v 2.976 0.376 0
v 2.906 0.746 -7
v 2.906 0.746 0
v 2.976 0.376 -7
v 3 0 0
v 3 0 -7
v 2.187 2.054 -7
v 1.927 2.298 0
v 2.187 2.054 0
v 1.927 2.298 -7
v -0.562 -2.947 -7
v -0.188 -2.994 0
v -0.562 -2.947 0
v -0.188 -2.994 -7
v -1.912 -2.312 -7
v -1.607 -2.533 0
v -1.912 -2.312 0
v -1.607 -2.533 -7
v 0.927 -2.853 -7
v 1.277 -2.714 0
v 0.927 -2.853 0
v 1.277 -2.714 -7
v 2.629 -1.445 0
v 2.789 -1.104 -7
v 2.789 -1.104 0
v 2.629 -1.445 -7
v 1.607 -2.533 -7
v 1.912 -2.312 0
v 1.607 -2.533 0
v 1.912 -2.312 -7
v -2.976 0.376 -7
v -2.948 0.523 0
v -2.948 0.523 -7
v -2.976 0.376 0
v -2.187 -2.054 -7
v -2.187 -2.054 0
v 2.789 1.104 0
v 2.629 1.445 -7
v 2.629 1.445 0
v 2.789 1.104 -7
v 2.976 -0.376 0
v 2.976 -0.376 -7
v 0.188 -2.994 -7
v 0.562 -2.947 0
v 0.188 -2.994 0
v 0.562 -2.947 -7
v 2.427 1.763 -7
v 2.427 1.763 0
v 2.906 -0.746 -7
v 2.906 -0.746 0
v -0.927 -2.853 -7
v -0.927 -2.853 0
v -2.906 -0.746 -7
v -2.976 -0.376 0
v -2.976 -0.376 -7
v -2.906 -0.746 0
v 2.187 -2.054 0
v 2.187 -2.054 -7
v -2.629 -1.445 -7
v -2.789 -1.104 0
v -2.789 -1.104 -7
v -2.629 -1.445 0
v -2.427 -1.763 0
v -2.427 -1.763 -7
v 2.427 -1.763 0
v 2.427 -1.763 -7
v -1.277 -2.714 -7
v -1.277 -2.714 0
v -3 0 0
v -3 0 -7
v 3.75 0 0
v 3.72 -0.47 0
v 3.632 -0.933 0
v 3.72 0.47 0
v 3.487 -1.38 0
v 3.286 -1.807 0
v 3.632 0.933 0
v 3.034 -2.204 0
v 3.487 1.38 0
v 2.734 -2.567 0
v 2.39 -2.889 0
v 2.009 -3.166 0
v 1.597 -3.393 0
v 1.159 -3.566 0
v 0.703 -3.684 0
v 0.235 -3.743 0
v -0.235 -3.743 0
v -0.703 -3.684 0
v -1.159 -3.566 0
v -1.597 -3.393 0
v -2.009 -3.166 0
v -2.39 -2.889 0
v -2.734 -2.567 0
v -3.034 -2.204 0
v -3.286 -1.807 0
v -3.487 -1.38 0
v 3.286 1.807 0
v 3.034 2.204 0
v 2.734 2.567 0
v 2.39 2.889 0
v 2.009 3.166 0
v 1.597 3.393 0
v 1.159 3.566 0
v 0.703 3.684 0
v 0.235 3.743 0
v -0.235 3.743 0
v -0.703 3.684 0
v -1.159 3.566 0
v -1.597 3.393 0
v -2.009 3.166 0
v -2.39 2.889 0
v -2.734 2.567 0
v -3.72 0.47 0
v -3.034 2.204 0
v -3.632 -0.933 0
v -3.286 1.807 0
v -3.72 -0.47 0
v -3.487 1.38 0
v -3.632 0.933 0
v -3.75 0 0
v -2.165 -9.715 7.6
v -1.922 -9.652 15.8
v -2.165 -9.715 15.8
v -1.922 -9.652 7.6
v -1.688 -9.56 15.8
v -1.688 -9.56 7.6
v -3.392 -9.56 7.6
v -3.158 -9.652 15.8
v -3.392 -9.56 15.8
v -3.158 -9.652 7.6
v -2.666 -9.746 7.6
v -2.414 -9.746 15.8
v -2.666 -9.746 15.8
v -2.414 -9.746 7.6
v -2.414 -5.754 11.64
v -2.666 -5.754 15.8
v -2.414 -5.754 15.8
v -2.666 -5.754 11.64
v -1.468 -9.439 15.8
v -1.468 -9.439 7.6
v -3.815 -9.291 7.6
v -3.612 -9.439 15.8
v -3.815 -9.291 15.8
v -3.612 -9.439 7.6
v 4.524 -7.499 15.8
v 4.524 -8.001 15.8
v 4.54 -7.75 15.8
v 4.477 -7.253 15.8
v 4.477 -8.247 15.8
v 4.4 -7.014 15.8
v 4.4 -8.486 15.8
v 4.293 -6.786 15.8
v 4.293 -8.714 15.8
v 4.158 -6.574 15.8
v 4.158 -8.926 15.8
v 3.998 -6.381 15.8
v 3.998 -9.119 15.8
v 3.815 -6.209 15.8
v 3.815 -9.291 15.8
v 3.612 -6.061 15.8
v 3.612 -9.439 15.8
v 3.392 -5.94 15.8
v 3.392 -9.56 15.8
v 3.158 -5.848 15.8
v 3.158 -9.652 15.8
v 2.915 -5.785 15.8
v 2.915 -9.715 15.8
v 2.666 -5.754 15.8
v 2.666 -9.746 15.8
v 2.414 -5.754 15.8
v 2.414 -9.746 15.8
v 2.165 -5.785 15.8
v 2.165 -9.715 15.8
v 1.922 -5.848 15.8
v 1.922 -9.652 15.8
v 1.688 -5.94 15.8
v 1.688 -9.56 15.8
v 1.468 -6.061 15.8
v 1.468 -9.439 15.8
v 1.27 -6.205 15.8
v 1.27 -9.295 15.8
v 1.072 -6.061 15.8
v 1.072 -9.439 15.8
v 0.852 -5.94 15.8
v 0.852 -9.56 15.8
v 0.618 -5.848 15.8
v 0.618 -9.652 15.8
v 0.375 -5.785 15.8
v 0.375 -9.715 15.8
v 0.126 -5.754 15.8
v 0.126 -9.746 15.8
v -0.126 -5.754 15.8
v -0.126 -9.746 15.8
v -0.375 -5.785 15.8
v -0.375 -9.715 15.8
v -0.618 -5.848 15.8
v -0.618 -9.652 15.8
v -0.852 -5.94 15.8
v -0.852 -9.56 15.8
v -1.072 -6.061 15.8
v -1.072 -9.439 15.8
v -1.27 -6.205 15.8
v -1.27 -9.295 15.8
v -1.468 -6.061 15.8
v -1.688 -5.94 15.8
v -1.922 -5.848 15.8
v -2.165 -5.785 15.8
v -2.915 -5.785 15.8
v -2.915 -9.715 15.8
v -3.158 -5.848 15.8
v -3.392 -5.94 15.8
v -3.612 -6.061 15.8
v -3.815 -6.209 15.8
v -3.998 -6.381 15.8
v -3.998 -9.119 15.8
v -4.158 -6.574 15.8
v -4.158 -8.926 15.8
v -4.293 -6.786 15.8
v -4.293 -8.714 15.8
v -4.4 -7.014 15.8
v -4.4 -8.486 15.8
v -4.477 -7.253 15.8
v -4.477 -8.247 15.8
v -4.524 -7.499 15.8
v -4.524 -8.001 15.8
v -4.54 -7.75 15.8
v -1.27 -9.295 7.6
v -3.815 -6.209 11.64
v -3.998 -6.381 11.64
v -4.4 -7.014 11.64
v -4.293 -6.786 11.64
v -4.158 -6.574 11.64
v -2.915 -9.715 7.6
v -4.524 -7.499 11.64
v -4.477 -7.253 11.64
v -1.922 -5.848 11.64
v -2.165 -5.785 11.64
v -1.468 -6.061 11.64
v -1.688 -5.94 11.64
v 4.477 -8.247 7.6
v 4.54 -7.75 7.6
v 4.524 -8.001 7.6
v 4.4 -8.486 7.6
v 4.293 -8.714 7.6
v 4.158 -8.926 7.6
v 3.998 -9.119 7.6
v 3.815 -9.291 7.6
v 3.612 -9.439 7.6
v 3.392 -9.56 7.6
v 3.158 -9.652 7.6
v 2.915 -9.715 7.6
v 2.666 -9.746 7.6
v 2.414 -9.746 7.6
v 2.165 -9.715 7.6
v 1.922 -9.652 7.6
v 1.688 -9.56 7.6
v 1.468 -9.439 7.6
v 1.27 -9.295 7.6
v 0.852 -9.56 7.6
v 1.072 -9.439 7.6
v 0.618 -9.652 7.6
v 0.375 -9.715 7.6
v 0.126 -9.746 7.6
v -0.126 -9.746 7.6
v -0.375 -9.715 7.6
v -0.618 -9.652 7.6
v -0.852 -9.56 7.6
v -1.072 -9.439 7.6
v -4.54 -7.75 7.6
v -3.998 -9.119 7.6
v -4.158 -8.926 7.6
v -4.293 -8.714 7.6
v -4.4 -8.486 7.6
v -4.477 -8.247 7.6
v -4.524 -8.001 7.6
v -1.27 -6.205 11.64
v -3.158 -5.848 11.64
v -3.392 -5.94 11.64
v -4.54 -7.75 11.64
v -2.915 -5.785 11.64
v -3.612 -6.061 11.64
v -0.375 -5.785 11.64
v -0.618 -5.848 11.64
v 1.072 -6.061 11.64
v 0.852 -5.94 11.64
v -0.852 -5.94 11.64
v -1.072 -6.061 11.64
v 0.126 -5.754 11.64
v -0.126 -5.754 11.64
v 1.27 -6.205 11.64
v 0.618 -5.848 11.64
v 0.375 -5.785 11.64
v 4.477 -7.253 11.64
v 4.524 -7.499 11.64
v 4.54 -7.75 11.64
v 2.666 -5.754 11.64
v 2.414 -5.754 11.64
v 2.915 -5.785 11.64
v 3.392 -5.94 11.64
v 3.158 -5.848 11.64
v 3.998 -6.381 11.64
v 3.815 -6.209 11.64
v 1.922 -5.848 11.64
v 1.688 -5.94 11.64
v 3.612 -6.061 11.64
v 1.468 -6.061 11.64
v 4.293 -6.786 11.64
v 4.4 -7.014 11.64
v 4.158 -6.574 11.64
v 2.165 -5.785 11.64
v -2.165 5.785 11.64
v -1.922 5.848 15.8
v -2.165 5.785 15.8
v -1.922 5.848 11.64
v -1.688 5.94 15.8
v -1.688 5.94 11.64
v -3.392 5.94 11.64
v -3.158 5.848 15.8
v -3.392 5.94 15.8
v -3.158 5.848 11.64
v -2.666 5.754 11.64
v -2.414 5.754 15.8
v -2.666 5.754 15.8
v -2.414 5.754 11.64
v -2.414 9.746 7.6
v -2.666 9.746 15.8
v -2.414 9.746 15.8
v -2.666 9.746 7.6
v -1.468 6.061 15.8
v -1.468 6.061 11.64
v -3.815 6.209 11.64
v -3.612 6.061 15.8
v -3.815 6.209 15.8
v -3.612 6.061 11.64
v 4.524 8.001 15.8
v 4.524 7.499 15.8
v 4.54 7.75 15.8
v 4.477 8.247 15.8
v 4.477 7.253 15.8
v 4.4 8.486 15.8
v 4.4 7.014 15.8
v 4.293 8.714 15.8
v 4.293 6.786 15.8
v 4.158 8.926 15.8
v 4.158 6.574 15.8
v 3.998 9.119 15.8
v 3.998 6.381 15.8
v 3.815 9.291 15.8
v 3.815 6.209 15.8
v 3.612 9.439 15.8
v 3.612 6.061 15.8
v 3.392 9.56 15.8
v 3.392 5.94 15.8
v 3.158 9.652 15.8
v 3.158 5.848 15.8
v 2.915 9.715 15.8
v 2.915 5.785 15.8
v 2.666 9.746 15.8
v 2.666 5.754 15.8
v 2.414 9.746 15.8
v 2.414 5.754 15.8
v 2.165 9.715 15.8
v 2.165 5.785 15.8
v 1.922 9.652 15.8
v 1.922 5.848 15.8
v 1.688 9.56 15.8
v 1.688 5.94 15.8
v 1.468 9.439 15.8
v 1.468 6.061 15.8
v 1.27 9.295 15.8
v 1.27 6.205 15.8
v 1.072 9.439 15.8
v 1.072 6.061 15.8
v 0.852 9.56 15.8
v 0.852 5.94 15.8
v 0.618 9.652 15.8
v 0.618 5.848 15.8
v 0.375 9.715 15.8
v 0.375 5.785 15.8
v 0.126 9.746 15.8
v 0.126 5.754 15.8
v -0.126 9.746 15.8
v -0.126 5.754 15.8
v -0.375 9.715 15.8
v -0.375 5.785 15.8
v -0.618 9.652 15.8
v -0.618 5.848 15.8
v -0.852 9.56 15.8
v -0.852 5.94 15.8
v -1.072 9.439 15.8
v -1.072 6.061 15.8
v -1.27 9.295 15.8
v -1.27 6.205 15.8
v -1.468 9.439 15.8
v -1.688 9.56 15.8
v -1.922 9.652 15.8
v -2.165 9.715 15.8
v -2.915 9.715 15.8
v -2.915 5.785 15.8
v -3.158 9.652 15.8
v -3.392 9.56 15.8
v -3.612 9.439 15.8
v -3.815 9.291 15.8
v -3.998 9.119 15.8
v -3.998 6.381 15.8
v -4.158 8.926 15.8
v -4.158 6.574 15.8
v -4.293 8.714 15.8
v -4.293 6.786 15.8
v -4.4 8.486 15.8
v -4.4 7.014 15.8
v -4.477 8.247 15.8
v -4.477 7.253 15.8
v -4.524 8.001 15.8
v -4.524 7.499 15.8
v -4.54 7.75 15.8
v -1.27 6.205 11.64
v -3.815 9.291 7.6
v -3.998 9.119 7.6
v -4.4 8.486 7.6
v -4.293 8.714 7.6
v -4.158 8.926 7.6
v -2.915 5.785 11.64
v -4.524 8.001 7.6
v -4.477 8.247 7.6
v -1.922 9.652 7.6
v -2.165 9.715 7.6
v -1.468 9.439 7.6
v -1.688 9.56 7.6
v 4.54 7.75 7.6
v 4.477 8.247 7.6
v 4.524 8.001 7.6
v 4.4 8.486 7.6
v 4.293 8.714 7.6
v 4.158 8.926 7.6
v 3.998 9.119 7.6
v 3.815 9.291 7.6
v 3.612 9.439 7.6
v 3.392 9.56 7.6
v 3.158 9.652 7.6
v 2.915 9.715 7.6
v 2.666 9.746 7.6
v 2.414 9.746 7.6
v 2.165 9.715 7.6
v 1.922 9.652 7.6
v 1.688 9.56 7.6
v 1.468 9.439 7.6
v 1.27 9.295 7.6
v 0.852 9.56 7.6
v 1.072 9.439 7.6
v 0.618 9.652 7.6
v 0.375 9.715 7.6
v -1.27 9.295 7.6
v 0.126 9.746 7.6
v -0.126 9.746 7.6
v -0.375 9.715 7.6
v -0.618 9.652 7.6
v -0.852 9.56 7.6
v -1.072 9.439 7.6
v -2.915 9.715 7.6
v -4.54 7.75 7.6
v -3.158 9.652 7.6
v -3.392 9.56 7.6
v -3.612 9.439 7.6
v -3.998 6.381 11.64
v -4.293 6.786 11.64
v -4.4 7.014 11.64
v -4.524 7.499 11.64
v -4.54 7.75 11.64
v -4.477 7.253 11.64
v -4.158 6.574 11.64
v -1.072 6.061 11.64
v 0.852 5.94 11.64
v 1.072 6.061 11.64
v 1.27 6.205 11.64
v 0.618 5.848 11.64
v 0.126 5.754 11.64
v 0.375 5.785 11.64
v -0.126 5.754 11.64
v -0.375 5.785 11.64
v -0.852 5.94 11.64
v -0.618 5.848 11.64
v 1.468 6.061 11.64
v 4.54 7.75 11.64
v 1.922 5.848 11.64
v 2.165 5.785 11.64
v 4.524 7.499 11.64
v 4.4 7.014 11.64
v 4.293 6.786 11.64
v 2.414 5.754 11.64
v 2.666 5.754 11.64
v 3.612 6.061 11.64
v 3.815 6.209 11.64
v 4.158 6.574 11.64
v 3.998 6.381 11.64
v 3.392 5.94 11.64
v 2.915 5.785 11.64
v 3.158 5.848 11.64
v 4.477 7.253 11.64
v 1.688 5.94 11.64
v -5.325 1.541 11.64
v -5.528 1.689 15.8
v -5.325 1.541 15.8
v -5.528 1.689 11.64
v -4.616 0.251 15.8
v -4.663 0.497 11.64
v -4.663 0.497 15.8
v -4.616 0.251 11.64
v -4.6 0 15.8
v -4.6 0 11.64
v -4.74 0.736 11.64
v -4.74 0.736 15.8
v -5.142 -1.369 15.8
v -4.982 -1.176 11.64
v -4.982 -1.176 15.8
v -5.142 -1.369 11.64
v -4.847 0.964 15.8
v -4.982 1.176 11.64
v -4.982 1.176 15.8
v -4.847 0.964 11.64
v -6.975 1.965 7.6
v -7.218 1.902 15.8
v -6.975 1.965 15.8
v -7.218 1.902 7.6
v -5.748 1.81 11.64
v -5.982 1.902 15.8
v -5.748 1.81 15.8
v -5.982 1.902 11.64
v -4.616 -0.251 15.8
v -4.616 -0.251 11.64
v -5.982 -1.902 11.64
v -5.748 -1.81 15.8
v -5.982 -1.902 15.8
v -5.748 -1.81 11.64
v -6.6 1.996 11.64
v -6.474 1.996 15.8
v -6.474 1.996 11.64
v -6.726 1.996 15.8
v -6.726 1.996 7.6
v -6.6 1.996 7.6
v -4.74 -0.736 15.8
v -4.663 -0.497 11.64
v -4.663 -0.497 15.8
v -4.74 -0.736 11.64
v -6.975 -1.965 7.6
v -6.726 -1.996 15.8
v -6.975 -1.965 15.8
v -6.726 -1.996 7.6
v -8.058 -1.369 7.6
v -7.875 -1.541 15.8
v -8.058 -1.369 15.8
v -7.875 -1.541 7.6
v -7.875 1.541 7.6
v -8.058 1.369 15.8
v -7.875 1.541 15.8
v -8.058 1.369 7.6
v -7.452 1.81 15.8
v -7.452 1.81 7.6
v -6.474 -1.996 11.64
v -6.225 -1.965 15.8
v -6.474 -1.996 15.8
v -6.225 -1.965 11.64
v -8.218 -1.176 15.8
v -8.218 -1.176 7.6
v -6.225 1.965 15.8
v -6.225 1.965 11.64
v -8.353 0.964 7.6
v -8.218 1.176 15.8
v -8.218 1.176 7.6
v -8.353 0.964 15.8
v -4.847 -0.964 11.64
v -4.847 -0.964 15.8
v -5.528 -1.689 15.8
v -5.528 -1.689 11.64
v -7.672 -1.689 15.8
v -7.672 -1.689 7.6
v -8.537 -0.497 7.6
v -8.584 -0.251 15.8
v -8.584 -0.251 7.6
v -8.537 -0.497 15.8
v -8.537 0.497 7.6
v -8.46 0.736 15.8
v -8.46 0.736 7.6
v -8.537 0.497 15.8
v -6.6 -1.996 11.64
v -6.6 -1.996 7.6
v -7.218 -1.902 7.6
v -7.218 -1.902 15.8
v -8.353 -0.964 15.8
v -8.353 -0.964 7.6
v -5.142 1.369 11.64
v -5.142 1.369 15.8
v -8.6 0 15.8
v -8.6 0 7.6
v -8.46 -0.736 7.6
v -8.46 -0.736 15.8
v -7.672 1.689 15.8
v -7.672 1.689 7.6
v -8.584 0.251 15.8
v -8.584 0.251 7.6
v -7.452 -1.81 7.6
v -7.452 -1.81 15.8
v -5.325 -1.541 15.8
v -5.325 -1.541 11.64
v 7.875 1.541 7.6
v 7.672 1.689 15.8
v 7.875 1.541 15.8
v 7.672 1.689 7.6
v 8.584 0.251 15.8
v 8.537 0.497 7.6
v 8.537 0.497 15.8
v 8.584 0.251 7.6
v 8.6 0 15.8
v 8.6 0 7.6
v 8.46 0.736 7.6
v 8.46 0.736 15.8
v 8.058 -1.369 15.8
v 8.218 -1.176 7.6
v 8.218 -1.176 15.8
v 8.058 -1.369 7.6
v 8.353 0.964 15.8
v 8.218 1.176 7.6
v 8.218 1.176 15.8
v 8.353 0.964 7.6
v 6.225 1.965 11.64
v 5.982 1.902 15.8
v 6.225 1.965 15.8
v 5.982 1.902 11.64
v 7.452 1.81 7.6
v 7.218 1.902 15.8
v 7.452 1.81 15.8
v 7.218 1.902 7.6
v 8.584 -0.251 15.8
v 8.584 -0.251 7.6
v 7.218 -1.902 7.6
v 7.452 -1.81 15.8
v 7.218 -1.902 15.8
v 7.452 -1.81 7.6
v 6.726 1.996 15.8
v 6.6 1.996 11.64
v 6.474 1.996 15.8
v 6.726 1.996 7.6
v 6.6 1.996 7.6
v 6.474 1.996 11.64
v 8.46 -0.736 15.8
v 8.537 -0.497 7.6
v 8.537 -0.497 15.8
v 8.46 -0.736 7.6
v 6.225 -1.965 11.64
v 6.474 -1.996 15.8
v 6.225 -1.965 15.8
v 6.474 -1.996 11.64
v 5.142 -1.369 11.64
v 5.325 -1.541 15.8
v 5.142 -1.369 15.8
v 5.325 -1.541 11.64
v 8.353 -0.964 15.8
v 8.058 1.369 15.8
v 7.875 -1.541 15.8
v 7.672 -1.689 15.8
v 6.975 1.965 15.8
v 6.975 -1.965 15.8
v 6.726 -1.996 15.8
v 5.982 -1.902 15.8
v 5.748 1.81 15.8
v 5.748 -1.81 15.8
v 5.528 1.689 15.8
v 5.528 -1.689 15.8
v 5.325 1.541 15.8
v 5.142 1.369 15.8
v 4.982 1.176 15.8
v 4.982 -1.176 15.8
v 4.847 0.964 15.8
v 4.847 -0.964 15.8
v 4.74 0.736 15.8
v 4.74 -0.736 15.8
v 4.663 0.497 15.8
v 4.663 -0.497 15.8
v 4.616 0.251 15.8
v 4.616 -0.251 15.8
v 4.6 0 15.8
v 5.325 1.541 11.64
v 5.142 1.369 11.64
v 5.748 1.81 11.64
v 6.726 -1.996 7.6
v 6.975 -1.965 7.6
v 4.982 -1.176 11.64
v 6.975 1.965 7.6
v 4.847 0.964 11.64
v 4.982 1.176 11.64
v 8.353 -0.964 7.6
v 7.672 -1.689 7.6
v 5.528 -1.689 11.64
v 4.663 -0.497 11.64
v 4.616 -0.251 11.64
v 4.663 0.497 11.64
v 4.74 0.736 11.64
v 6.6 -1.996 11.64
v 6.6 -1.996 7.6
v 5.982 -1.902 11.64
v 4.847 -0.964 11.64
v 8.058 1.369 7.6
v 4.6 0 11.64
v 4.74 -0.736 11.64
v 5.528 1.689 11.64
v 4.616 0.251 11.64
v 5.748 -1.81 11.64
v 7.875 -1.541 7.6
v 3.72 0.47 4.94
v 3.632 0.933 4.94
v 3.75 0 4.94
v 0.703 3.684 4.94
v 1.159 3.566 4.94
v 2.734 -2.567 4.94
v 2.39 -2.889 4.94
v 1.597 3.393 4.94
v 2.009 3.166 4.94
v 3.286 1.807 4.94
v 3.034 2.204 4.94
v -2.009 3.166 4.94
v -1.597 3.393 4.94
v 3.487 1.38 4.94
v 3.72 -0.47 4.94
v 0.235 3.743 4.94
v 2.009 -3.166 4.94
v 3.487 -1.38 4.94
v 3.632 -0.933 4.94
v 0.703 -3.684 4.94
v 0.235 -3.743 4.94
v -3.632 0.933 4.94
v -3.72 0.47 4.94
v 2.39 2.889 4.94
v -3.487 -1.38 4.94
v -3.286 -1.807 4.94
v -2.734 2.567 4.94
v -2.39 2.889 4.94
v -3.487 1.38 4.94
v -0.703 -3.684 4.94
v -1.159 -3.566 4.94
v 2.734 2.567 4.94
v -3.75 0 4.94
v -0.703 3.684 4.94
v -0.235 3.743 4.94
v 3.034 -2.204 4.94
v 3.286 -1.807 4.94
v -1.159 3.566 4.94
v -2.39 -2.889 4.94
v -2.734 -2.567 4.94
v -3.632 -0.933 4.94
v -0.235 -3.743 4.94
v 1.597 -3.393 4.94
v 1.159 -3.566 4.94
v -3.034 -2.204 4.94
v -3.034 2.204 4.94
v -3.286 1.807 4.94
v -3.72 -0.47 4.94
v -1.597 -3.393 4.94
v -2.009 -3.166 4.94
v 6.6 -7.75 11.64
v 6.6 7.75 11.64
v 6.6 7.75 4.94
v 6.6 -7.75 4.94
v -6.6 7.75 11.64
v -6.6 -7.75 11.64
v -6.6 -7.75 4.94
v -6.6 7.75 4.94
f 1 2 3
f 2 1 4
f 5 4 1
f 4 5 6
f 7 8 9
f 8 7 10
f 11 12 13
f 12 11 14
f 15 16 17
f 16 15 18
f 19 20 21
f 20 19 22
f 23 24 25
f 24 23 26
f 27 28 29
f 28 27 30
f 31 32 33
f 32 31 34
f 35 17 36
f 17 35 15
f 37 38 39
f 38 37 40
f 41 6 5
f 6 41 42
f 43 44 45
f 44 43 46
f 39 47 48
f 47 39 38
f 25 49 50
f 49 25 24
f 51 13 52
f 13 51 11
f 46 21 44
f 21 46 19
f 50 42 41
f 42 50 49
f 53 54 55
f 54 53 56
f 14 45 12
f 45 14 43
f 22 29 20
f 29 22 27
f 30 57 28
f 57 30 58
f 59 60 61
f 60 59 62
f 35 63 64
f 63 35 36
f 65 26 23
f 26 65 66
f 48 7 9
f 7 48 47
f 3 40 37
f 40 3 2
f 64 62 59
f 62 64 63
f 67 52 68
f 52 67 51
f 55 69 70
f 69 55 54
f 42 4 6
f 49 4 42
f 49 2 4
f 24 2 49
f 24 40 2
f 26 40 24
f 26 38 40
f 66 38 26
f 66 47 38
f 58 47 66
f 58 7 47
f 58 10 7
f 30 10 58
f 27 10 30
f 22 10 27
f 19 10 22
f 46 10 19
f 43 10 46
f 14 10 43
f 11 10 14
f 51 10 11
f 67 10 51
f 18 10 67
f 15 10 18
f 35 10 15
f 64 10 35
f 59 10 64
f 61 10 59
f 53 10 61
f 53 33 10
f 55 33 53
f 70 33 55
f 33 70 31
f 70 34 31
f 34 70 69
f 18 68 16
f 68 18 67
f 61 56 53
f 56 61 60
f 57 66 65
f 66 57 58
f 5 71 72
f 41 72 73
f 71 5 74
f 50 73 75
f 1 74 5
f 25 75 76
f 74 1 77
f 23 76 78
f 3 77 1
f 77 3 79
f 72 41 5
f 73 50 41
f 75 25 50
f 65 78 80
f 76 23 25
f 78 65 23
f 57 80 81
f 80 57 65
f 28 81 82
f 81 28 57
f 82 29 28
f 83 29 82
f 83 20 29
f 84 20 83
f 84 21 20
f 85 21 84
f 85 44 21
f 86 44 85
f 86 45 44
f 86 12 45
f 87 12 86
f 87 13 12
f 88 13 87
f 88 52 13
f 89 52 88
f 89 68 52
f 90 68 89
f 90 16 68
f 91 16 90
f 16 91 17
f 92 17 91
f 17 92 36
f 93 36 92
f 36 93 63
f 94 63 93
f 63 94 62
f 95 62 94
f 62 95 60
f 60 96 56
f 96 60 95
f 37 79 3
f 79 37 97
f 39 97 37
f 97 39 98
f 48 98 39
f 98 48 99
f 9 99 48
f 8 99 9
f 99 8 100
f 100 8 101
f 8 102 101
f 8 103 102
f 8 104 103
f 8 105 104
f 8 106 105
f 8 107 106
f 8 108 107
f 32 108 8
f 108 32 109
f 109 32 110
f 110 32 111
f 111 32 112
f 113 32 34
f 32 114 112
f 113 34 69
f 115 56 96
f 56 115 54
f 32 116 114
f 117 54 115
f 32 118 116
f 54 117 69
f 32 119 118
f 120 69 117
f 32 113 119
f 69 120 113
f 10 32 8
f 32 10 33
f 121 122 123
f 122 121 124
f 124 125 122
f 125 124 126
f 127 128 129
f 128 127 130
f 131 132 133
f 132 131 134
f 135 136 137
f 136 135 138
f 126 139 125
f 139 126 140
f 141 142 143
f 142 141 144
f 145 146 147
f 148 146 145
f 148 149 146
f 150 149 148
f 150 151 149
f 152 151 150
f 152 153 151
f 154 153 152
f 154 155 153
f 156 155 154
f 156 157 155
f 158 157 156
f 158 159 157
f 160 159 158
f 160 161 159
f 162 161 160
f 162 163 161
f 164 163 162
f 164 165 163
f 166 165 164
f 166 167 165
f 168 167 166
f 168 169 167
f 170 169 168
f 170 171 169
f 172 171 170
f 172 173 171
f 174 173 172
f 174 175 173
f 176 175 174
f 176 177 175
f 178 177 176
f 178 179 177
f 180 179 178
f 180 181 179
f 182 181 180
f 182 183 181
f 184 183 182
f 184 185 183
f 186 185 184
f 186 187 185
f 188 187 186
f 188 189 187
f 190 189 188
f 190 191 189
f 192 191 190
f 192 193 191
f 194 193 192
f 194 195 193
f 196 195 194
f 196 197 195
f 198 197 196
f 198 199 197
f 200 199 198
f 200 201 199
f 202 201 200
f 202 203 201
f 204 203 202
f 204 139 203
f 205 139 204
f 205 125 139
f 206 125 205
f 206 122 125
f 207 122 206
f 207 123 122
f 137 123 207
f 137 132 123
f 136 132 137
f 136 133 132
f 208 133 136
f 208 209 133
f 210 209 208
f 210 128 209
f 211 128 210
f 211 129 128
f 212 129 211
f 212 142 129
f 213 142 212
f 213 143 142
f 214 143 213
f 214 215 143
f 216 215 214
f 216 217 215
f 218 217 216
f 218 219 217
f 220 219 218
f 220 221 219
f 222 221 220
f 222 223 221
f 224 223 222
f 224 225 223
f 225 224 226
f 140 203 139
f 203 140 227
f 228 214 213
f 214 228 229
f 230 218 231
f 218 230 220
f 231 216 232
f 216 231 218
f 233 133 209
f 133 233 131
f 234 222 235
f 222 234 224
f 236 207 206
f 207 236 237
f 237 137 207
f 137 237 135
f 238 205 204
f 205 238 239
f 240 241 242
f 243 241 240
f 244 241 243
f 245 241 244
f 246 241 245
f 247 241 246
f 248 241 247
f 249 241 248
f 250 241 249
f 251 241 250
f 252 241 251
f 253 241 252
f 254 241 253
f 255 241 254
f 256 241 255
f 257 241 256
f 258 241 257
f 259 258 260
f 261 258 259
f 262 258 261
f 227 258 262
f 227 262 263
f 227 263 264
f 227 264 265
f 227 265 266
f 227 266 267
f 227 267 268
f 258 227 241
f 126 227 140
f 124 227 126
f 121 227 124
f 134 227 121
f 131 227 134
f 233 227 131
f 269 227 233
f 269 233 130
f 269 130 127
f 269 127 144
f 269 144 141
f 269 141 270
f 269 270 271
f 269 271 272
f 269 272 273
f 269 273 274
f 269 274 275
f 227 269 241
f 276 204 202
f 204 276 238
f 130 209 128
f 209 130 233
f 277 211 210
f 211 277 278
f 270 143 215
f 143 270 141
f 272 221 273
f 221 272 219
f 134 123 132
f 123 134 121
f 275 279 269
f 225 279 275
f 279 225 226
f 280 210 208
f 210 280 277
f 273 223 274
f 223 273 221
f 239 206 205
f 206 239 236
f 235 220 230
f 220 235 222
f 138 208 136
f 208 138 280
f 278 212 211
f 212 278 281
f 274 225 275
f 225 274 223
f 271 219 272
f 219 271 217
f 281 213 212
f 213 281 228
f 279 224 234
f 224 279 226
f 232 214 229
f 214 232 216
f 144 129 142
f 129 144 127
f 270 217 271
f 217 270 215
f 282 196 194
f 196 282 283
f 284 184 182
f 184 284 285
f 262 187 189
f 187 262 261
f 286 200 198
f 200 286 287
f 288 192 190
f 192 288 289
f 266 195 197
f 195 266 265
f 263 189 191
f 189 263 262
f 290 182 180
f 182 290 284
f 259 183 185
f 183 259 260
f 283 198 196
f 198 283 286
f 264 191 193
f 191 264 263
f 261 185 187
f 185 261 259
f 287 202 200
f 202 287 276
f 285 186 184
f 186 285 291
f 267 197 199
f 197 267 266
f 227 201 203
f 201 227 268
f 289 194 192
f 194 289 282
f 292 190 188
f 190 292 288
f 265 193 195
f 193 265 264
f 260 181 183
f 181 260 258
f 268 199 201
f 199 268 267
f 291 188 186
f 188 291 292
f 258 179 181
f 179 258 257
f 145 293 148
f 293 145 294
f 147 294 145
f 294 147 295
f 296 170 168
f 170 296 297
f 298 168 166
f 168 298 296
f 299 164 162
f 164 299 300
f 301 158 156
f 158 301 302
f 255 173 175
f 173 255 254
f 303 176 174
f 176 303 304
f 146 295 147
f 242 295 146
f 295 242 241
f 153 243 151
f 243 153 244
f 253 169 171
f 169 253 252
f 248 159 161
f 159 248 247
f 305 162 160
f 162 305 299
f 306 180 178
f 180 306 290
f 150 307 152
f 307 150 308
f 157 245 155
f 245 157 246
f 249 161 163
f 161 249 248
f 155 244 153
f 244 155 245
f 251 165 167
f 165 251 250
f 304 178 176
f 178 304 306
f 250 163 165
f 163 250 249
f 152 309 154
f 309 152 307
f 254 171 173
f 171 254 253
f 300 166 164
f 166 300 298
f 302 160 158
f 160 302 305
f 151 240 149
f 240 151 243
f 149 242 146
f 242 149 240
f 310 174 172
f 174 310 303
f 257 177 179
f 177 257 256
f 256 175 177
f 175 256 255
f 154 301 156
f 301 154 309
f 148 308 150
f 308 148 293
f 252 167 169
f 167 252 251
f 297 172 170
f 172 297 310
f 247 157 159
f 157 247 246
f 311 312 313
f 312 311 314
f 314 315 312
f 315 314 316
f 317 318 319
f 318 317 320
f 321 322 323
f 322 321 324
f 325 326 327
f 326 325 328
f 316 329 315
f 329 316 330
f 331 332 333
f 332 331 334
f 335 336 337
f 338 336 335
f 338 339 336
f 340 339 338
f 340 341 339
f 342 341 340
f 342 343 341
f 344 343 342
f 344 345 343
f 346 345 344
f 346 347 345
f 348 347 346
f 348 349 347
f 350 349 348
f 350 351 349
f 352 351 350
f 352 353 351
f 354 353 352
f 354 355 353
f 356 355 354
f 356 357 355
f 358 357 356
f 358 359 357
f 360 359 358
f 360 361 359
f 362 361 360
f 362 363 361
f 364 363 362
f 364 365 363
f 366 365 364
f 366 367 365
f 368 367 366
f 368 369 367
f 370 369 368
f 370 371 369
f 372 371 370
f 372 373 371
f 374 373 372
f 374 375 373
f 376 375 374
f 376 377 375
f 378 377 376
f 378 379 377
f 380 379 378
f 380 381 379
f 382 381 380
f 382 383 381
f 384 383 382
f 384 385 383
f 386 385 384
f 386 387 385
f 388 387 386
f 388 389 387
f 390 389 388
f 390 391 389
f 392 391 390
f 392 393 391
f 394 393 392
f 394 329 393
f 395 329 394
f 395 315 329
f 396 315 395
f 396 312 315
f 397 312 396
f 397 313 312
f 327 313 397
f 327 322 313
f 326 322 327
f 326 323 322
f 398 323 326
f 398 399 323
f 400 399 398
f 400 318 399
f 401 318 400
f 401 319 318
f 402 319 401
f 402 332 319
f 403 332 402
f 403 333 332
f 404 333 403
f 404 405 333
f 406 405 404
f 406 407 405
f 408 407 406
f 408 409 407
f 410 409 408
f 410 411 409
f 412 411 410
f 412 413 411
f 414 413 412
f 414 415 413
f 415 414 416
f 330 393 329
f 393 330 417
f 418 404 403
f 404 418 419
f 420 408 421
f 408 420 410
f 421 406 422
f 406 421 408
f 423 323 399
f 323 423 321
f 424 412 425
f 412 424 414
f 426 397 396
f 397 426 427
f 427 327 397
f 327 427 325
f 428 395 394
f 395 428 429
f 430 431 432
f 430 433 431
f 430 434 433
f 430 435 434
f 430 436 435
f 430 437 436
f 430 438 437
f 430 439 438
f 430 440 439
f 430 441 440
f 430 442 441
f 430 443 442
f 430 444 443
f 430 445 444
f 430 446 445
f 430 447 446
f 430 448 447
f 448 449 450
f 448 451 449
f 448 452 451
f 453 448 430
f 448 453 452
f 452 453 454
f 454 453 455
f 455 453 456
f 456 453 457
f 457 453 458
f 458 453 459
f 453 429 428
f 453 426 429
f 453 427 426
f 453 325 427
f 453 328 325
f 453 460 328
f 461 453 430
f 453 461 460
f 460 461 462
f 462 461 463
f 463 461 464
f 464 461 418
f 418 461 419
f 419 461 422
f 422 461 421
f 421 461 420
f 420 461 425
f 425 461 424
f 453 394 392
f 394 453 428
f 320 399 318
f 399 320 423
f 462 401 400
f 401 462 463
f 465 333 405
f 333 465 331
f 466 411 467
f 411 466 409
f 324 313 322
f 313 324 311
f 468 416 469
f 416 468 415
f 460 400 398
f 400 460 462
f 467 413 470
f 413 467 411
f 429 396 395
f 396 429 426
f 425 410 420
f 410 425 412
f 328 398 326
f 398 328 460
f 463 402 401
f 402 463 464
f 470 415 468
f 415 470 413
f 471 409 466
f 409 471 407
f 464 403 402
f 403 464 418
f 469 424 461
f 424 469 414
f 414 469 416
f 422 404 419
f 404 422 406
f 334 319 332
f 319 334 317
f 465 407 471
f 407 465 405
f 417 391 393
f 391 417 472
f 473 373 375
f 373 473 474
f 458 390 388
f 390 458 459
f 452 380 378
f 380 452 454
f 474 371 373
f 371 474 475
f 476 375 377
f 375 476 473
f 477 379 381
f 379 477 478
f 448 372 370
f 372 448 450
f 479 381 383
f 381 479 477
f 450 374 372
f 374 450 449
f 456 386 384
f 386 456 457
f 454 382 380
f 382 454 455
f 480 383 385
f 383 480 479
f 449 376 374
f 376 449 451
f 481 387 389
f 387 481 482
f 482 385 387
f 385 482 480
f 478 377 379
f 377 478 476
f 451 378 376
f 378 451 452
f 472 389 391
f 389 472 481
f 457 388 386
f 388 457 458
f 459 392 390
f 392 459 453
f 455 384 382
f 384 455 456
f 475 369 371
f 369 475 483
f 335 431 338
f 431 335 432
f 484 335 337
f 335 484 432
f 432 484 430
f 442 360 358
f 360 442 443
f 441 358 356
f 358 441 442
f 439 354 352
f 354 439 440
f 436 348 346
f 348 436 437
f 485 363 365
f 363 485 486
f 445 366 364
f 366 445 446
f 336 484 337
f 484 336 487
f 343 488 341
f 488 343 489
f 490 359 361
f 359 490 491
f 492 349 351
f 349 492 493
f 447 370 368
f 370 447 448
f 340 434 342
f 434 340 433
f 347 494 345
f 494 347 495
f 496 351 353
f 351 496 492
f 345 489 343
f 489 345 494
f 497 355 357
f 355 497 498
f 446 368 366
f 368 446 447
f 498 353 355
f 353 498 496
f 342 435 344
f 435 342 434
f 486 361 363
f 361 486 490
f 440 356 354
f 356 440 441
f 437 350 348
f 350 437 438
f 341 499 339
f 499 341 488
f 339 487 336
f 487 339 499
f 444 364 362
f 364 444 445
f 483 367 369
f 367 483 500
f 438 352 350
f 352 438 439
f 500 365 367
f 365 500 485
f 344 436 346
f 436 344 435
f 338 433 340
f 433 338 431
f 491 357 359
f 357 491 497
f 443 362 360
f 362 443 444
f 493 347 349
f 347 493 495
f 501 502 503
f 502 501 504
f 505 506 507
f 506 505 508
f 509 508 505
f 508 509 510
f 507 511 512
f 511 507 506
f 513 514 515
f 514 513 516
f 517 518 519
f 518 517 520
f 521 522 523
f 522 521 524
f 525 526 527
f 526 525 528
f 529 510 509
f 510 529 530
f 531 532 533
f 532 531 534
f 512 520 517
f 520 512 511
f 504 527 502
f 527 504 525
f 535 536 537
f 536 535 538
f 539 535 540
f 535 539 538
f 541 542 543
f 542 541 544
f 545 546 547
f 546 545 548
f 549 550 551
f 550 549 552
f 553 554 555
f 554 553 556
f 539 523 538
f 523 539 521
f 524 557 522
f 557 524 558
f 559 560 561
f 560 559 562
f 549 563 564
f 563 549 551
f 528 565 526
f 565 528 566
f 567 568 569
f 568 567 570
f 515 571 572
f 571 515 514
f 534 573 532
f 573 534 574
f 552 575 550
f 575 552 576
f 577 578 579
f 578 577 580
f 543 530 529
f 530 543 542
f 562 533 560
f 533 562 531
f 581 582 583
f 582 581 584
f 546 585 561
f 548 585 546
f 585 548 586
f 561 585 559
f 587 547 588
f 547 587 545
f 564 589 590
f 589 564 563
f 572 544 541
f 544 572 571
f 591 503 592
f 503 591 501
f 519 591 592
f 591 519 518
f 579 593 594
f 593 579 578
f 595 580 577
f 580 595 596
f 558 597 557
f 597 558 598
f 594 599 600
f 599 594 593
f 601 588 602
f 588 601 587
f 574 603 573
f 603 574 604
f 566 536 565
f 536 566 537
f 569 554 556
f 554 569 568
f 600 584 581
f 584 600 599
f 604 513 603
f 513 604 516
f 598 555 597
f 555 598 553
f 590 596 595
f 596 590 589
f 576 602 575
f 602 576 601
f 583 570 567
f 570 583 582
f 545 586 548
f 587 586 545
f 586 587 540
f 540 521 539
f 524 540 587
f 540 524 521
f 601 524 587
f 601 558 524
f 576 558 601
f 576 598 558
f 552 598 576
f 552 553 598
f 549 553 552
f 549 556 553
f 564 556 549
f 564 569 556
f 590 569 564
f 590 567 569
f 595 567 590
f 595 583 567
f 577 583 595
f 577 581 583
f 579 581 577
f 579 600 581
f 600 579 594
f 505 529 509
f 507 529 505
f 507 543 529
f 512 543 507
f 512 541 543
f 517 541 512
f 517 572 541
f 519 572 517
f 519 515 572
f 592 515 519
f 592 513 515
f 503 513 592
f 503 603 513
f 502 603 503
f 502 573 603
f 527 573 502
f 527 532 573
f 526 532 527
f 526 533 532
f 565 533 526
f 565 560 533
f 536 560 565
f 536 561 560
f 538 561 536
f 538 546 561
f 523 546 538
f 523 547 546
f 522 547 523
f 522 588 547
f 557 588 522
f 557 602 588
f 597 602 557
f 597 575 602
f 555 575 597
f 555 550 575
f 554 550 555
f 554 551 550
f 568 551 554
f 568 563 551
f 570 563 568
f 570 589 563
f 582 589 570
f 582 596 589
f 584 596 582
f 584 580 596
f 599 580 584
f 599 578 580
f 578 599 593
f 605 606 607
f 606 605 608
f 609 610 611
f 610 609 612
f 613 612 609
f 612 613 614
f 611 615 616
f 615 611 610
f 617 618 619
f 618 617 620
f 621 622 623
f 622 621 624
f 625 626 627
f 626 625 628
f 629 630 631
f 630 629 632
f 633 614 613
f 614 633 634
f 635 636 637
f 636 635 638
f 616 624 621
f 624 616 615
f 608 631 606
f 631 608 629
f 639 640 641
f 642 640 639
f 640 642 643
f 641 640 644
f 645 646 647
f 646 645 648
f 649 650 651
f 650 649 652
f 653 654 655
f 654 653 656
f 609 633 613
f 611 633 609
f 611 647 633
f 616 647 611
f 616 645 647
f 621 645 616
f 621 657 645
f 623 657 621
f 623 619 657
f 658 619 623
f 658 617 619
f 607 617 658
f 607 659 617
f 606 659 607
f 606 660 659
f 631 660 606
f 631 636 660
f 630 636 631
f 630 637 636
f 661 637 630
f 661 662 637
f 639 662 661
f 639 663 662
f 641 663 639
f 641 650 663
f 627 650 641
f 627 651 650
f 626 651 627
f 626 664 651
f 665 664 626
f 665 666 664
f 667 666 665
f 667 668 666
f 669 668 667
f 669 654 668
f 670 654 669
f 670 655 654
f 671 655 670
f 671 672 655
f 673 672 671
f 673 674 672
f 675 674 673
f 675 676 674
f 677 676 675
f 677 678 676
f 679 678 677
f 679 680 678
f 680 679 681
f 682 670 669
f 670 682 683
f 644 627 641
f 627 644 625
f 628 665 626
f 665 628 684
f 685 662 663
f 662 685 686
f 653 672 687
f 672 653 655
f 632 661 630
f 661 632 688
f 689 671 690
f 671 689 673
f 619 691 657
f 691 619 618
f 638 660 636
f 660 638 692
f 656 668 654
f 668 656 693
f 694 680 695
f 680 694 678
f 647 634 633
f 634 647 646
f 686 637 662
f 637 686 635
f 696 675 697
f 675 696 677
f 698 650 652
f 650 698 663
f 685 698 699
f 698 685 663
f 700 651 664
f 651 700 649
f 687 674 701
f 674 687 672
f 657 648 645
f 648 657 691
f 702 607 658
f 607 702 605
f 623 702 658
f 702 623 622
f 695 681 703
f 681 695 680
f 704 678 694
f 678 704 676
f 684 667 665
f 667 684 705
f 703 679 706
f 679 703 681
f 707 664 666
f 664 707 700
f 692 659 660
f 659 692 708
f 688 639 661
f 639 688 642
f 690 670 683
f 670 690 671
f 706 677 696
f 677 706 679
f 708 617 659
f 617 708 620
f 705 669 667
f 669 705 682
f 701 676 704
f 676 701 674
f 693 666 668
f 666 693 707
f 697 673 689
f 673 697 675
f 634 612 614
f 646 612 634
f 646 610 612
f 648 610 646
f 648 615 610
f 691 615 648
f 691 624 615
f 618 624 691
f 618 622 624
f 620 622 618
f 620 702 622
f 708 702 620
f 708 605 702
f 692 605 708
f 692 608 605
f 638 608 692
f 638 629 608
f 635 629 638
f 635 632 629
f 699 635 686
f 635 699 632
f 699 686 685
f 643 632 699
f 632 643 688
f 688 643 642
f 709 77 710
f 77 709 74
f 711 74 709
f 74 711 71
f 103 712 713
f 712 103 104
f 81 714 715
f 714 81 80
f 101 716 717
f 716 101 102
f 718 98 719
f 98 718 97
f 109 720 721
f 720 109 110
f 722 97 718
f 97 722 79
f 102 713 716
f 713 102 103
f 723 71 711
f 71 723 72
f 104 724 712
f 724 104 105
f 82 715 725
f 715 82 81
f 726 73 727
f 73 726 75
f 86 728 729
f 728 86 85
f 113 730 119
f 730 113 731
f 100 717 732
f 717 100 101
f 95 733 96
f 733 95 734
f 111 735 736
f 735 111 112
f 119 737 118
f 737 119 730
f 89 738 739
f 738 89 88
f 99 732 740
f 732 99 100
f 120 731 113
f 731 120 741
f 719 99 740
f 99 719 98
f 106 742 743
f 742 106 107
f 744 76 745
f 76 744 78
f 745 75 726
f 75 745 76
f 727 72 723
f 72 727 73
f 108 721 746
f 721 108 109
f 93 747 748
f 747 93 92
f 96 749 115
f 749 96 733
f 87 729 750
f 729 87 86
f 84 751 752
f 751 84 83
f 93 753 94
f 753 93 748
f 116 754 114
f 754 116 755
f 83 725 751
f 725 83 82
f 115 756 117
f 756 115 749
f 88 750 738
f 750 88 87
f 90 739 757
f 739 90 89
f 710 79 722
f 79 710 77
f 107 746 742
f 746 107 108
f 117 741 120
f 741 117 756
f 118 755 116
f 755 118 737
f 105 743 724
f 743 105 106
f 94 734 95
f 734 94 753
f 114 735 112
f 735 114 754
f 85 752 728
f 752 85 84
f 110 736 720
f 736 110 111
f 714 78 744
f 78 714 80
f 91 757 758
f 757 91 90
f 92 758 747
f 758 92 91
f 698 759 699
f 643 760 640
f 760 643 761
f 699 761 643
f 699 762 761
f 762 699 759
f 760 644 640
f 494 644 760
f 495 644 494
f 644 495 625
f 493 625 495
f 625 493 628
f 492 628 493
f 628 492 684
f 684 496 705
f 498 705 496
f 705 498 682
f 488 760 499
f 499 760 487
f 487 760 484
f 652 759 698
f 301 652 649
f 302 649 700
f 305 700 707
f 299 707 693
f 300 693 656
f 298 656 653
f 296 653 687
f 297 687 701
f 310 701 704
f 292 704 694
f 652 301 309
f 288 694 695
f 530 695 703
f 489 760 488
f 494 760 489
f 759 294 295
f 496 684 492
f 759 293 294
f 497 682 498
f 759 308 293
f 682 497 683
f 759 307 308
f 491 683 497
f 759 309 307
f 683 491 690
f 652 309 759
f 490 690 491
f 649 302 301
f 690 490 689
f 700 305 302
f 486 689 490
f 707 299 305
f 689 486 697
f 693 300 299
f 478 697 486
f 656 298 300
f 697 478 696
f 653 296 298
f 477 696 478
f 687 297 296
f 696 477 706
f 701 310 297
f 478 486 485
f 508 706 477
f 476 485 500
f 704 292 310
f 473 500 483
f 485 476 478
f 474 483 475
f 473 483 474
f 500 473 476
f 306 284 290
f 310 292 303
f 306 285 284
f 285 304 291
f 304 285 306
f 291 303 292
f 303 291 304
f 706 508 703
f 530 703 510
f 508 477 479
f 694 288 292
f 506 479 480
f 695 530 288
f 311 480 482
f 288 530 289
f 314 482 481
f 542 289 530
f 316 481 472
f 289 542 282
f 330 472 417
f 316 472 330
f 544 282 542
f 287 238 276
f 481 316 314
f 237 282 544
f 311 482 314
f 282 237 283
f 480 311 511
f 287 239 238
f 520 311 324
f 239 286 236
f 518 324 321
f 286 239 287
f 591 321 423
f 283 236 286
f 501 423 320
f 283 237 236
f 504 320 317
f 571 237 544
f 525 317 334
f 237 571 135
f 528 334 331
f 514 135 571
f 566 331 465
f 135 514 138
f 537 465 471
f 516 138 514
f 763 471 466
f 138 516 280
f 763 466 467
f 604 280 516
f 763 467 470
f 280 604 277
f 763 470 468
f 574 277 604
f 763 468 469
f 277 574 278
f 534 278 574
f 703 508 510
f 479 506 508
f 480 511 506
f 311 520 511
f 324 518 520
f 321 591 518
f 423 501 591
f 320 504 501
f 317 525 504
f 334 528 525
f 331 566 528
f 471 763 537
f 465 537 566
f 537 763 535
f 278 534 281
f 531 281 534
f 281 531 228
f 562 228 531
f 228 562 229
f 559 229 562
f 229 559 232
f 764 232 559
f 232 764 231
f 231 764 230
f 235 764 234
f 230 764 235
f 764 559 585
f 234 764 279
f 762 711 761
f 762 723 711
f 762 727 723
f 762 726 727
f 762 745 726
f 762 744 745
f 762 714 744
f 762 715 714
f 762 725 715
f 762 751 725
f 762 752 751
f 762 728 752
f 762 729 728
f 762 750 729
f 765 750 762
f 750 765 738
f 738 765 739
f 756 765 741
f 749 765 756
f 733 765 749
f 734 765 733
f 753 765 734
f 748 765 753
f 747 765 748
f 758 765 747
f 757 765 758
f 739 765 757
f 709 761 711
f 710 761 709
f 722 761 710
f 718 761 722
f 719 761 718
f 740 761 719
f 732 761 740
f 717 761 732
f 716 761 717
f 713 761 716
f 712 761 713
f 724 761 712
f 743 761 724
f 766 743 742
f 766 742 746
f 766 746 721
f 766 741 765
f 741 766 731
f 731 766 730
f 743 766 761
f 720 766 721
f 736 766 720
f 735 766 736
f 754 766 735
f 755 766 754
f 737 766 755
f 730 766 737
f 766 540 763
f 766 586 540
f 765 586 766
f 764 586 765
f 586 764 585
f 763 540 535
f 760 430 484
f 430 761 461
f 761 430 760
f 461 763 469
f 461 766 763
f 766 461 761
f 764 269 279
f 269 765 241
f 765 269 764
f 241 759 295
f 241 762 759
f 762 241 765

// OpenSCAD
encoderHull();

$fn = 50;

encX	= 12.7	+0.5;
encY	= 15	+0.5;
encZ	= 6.6;
tipDia	= 6;
tipCut	= 4.5;
tipLen	= 7;
rodDia	= 7		+0.5;
rodLen	= 6		-1;
pinH	= 7.2	+1;
pinD	= 2		+2;
pinOff	= 4;
pinZ	= rodLen+encZ-pinOff;

function encoderX() = encX;
function encoderY() = encY;
function encoderZ() = encZ+rodLen+pinH-pinOff;


module encoderHull()
{
	cylinder(r=rodDia/2, h=rodLen+1, center=false);

	translate([0, 0, -tipLen])
	difference()
	{
		cylinder(r=tipDia/2, h=tipLen+1, center=false);

		rotate([0, 0, -70])
		translate([tipDia/2-tipCut, tipDia, -1])
		rotate([0, 0, 180])
		cube([2*tipDia, 2*tipDia, tipLen+1]);
	}

	translate([0, 0, rodLen+encZ/2-0.01])
	cube([encX, encY, encZ+0.1], center = true);

	for (iy=[-1, 1])
	{
		for (ix=[-1, 0, 1])
		{
			translate([ix*2.54, iy*encY/2, pinZ])
			cylinder(r=pinD/2, h=pinH, center=false);
		}
	}

	for (ix=[-1, 1])
	{
		translate([ix*encX/2, 0, pinZ])
		cylinder(r=pinD/2, h=pinH, center=false);
	}
}
